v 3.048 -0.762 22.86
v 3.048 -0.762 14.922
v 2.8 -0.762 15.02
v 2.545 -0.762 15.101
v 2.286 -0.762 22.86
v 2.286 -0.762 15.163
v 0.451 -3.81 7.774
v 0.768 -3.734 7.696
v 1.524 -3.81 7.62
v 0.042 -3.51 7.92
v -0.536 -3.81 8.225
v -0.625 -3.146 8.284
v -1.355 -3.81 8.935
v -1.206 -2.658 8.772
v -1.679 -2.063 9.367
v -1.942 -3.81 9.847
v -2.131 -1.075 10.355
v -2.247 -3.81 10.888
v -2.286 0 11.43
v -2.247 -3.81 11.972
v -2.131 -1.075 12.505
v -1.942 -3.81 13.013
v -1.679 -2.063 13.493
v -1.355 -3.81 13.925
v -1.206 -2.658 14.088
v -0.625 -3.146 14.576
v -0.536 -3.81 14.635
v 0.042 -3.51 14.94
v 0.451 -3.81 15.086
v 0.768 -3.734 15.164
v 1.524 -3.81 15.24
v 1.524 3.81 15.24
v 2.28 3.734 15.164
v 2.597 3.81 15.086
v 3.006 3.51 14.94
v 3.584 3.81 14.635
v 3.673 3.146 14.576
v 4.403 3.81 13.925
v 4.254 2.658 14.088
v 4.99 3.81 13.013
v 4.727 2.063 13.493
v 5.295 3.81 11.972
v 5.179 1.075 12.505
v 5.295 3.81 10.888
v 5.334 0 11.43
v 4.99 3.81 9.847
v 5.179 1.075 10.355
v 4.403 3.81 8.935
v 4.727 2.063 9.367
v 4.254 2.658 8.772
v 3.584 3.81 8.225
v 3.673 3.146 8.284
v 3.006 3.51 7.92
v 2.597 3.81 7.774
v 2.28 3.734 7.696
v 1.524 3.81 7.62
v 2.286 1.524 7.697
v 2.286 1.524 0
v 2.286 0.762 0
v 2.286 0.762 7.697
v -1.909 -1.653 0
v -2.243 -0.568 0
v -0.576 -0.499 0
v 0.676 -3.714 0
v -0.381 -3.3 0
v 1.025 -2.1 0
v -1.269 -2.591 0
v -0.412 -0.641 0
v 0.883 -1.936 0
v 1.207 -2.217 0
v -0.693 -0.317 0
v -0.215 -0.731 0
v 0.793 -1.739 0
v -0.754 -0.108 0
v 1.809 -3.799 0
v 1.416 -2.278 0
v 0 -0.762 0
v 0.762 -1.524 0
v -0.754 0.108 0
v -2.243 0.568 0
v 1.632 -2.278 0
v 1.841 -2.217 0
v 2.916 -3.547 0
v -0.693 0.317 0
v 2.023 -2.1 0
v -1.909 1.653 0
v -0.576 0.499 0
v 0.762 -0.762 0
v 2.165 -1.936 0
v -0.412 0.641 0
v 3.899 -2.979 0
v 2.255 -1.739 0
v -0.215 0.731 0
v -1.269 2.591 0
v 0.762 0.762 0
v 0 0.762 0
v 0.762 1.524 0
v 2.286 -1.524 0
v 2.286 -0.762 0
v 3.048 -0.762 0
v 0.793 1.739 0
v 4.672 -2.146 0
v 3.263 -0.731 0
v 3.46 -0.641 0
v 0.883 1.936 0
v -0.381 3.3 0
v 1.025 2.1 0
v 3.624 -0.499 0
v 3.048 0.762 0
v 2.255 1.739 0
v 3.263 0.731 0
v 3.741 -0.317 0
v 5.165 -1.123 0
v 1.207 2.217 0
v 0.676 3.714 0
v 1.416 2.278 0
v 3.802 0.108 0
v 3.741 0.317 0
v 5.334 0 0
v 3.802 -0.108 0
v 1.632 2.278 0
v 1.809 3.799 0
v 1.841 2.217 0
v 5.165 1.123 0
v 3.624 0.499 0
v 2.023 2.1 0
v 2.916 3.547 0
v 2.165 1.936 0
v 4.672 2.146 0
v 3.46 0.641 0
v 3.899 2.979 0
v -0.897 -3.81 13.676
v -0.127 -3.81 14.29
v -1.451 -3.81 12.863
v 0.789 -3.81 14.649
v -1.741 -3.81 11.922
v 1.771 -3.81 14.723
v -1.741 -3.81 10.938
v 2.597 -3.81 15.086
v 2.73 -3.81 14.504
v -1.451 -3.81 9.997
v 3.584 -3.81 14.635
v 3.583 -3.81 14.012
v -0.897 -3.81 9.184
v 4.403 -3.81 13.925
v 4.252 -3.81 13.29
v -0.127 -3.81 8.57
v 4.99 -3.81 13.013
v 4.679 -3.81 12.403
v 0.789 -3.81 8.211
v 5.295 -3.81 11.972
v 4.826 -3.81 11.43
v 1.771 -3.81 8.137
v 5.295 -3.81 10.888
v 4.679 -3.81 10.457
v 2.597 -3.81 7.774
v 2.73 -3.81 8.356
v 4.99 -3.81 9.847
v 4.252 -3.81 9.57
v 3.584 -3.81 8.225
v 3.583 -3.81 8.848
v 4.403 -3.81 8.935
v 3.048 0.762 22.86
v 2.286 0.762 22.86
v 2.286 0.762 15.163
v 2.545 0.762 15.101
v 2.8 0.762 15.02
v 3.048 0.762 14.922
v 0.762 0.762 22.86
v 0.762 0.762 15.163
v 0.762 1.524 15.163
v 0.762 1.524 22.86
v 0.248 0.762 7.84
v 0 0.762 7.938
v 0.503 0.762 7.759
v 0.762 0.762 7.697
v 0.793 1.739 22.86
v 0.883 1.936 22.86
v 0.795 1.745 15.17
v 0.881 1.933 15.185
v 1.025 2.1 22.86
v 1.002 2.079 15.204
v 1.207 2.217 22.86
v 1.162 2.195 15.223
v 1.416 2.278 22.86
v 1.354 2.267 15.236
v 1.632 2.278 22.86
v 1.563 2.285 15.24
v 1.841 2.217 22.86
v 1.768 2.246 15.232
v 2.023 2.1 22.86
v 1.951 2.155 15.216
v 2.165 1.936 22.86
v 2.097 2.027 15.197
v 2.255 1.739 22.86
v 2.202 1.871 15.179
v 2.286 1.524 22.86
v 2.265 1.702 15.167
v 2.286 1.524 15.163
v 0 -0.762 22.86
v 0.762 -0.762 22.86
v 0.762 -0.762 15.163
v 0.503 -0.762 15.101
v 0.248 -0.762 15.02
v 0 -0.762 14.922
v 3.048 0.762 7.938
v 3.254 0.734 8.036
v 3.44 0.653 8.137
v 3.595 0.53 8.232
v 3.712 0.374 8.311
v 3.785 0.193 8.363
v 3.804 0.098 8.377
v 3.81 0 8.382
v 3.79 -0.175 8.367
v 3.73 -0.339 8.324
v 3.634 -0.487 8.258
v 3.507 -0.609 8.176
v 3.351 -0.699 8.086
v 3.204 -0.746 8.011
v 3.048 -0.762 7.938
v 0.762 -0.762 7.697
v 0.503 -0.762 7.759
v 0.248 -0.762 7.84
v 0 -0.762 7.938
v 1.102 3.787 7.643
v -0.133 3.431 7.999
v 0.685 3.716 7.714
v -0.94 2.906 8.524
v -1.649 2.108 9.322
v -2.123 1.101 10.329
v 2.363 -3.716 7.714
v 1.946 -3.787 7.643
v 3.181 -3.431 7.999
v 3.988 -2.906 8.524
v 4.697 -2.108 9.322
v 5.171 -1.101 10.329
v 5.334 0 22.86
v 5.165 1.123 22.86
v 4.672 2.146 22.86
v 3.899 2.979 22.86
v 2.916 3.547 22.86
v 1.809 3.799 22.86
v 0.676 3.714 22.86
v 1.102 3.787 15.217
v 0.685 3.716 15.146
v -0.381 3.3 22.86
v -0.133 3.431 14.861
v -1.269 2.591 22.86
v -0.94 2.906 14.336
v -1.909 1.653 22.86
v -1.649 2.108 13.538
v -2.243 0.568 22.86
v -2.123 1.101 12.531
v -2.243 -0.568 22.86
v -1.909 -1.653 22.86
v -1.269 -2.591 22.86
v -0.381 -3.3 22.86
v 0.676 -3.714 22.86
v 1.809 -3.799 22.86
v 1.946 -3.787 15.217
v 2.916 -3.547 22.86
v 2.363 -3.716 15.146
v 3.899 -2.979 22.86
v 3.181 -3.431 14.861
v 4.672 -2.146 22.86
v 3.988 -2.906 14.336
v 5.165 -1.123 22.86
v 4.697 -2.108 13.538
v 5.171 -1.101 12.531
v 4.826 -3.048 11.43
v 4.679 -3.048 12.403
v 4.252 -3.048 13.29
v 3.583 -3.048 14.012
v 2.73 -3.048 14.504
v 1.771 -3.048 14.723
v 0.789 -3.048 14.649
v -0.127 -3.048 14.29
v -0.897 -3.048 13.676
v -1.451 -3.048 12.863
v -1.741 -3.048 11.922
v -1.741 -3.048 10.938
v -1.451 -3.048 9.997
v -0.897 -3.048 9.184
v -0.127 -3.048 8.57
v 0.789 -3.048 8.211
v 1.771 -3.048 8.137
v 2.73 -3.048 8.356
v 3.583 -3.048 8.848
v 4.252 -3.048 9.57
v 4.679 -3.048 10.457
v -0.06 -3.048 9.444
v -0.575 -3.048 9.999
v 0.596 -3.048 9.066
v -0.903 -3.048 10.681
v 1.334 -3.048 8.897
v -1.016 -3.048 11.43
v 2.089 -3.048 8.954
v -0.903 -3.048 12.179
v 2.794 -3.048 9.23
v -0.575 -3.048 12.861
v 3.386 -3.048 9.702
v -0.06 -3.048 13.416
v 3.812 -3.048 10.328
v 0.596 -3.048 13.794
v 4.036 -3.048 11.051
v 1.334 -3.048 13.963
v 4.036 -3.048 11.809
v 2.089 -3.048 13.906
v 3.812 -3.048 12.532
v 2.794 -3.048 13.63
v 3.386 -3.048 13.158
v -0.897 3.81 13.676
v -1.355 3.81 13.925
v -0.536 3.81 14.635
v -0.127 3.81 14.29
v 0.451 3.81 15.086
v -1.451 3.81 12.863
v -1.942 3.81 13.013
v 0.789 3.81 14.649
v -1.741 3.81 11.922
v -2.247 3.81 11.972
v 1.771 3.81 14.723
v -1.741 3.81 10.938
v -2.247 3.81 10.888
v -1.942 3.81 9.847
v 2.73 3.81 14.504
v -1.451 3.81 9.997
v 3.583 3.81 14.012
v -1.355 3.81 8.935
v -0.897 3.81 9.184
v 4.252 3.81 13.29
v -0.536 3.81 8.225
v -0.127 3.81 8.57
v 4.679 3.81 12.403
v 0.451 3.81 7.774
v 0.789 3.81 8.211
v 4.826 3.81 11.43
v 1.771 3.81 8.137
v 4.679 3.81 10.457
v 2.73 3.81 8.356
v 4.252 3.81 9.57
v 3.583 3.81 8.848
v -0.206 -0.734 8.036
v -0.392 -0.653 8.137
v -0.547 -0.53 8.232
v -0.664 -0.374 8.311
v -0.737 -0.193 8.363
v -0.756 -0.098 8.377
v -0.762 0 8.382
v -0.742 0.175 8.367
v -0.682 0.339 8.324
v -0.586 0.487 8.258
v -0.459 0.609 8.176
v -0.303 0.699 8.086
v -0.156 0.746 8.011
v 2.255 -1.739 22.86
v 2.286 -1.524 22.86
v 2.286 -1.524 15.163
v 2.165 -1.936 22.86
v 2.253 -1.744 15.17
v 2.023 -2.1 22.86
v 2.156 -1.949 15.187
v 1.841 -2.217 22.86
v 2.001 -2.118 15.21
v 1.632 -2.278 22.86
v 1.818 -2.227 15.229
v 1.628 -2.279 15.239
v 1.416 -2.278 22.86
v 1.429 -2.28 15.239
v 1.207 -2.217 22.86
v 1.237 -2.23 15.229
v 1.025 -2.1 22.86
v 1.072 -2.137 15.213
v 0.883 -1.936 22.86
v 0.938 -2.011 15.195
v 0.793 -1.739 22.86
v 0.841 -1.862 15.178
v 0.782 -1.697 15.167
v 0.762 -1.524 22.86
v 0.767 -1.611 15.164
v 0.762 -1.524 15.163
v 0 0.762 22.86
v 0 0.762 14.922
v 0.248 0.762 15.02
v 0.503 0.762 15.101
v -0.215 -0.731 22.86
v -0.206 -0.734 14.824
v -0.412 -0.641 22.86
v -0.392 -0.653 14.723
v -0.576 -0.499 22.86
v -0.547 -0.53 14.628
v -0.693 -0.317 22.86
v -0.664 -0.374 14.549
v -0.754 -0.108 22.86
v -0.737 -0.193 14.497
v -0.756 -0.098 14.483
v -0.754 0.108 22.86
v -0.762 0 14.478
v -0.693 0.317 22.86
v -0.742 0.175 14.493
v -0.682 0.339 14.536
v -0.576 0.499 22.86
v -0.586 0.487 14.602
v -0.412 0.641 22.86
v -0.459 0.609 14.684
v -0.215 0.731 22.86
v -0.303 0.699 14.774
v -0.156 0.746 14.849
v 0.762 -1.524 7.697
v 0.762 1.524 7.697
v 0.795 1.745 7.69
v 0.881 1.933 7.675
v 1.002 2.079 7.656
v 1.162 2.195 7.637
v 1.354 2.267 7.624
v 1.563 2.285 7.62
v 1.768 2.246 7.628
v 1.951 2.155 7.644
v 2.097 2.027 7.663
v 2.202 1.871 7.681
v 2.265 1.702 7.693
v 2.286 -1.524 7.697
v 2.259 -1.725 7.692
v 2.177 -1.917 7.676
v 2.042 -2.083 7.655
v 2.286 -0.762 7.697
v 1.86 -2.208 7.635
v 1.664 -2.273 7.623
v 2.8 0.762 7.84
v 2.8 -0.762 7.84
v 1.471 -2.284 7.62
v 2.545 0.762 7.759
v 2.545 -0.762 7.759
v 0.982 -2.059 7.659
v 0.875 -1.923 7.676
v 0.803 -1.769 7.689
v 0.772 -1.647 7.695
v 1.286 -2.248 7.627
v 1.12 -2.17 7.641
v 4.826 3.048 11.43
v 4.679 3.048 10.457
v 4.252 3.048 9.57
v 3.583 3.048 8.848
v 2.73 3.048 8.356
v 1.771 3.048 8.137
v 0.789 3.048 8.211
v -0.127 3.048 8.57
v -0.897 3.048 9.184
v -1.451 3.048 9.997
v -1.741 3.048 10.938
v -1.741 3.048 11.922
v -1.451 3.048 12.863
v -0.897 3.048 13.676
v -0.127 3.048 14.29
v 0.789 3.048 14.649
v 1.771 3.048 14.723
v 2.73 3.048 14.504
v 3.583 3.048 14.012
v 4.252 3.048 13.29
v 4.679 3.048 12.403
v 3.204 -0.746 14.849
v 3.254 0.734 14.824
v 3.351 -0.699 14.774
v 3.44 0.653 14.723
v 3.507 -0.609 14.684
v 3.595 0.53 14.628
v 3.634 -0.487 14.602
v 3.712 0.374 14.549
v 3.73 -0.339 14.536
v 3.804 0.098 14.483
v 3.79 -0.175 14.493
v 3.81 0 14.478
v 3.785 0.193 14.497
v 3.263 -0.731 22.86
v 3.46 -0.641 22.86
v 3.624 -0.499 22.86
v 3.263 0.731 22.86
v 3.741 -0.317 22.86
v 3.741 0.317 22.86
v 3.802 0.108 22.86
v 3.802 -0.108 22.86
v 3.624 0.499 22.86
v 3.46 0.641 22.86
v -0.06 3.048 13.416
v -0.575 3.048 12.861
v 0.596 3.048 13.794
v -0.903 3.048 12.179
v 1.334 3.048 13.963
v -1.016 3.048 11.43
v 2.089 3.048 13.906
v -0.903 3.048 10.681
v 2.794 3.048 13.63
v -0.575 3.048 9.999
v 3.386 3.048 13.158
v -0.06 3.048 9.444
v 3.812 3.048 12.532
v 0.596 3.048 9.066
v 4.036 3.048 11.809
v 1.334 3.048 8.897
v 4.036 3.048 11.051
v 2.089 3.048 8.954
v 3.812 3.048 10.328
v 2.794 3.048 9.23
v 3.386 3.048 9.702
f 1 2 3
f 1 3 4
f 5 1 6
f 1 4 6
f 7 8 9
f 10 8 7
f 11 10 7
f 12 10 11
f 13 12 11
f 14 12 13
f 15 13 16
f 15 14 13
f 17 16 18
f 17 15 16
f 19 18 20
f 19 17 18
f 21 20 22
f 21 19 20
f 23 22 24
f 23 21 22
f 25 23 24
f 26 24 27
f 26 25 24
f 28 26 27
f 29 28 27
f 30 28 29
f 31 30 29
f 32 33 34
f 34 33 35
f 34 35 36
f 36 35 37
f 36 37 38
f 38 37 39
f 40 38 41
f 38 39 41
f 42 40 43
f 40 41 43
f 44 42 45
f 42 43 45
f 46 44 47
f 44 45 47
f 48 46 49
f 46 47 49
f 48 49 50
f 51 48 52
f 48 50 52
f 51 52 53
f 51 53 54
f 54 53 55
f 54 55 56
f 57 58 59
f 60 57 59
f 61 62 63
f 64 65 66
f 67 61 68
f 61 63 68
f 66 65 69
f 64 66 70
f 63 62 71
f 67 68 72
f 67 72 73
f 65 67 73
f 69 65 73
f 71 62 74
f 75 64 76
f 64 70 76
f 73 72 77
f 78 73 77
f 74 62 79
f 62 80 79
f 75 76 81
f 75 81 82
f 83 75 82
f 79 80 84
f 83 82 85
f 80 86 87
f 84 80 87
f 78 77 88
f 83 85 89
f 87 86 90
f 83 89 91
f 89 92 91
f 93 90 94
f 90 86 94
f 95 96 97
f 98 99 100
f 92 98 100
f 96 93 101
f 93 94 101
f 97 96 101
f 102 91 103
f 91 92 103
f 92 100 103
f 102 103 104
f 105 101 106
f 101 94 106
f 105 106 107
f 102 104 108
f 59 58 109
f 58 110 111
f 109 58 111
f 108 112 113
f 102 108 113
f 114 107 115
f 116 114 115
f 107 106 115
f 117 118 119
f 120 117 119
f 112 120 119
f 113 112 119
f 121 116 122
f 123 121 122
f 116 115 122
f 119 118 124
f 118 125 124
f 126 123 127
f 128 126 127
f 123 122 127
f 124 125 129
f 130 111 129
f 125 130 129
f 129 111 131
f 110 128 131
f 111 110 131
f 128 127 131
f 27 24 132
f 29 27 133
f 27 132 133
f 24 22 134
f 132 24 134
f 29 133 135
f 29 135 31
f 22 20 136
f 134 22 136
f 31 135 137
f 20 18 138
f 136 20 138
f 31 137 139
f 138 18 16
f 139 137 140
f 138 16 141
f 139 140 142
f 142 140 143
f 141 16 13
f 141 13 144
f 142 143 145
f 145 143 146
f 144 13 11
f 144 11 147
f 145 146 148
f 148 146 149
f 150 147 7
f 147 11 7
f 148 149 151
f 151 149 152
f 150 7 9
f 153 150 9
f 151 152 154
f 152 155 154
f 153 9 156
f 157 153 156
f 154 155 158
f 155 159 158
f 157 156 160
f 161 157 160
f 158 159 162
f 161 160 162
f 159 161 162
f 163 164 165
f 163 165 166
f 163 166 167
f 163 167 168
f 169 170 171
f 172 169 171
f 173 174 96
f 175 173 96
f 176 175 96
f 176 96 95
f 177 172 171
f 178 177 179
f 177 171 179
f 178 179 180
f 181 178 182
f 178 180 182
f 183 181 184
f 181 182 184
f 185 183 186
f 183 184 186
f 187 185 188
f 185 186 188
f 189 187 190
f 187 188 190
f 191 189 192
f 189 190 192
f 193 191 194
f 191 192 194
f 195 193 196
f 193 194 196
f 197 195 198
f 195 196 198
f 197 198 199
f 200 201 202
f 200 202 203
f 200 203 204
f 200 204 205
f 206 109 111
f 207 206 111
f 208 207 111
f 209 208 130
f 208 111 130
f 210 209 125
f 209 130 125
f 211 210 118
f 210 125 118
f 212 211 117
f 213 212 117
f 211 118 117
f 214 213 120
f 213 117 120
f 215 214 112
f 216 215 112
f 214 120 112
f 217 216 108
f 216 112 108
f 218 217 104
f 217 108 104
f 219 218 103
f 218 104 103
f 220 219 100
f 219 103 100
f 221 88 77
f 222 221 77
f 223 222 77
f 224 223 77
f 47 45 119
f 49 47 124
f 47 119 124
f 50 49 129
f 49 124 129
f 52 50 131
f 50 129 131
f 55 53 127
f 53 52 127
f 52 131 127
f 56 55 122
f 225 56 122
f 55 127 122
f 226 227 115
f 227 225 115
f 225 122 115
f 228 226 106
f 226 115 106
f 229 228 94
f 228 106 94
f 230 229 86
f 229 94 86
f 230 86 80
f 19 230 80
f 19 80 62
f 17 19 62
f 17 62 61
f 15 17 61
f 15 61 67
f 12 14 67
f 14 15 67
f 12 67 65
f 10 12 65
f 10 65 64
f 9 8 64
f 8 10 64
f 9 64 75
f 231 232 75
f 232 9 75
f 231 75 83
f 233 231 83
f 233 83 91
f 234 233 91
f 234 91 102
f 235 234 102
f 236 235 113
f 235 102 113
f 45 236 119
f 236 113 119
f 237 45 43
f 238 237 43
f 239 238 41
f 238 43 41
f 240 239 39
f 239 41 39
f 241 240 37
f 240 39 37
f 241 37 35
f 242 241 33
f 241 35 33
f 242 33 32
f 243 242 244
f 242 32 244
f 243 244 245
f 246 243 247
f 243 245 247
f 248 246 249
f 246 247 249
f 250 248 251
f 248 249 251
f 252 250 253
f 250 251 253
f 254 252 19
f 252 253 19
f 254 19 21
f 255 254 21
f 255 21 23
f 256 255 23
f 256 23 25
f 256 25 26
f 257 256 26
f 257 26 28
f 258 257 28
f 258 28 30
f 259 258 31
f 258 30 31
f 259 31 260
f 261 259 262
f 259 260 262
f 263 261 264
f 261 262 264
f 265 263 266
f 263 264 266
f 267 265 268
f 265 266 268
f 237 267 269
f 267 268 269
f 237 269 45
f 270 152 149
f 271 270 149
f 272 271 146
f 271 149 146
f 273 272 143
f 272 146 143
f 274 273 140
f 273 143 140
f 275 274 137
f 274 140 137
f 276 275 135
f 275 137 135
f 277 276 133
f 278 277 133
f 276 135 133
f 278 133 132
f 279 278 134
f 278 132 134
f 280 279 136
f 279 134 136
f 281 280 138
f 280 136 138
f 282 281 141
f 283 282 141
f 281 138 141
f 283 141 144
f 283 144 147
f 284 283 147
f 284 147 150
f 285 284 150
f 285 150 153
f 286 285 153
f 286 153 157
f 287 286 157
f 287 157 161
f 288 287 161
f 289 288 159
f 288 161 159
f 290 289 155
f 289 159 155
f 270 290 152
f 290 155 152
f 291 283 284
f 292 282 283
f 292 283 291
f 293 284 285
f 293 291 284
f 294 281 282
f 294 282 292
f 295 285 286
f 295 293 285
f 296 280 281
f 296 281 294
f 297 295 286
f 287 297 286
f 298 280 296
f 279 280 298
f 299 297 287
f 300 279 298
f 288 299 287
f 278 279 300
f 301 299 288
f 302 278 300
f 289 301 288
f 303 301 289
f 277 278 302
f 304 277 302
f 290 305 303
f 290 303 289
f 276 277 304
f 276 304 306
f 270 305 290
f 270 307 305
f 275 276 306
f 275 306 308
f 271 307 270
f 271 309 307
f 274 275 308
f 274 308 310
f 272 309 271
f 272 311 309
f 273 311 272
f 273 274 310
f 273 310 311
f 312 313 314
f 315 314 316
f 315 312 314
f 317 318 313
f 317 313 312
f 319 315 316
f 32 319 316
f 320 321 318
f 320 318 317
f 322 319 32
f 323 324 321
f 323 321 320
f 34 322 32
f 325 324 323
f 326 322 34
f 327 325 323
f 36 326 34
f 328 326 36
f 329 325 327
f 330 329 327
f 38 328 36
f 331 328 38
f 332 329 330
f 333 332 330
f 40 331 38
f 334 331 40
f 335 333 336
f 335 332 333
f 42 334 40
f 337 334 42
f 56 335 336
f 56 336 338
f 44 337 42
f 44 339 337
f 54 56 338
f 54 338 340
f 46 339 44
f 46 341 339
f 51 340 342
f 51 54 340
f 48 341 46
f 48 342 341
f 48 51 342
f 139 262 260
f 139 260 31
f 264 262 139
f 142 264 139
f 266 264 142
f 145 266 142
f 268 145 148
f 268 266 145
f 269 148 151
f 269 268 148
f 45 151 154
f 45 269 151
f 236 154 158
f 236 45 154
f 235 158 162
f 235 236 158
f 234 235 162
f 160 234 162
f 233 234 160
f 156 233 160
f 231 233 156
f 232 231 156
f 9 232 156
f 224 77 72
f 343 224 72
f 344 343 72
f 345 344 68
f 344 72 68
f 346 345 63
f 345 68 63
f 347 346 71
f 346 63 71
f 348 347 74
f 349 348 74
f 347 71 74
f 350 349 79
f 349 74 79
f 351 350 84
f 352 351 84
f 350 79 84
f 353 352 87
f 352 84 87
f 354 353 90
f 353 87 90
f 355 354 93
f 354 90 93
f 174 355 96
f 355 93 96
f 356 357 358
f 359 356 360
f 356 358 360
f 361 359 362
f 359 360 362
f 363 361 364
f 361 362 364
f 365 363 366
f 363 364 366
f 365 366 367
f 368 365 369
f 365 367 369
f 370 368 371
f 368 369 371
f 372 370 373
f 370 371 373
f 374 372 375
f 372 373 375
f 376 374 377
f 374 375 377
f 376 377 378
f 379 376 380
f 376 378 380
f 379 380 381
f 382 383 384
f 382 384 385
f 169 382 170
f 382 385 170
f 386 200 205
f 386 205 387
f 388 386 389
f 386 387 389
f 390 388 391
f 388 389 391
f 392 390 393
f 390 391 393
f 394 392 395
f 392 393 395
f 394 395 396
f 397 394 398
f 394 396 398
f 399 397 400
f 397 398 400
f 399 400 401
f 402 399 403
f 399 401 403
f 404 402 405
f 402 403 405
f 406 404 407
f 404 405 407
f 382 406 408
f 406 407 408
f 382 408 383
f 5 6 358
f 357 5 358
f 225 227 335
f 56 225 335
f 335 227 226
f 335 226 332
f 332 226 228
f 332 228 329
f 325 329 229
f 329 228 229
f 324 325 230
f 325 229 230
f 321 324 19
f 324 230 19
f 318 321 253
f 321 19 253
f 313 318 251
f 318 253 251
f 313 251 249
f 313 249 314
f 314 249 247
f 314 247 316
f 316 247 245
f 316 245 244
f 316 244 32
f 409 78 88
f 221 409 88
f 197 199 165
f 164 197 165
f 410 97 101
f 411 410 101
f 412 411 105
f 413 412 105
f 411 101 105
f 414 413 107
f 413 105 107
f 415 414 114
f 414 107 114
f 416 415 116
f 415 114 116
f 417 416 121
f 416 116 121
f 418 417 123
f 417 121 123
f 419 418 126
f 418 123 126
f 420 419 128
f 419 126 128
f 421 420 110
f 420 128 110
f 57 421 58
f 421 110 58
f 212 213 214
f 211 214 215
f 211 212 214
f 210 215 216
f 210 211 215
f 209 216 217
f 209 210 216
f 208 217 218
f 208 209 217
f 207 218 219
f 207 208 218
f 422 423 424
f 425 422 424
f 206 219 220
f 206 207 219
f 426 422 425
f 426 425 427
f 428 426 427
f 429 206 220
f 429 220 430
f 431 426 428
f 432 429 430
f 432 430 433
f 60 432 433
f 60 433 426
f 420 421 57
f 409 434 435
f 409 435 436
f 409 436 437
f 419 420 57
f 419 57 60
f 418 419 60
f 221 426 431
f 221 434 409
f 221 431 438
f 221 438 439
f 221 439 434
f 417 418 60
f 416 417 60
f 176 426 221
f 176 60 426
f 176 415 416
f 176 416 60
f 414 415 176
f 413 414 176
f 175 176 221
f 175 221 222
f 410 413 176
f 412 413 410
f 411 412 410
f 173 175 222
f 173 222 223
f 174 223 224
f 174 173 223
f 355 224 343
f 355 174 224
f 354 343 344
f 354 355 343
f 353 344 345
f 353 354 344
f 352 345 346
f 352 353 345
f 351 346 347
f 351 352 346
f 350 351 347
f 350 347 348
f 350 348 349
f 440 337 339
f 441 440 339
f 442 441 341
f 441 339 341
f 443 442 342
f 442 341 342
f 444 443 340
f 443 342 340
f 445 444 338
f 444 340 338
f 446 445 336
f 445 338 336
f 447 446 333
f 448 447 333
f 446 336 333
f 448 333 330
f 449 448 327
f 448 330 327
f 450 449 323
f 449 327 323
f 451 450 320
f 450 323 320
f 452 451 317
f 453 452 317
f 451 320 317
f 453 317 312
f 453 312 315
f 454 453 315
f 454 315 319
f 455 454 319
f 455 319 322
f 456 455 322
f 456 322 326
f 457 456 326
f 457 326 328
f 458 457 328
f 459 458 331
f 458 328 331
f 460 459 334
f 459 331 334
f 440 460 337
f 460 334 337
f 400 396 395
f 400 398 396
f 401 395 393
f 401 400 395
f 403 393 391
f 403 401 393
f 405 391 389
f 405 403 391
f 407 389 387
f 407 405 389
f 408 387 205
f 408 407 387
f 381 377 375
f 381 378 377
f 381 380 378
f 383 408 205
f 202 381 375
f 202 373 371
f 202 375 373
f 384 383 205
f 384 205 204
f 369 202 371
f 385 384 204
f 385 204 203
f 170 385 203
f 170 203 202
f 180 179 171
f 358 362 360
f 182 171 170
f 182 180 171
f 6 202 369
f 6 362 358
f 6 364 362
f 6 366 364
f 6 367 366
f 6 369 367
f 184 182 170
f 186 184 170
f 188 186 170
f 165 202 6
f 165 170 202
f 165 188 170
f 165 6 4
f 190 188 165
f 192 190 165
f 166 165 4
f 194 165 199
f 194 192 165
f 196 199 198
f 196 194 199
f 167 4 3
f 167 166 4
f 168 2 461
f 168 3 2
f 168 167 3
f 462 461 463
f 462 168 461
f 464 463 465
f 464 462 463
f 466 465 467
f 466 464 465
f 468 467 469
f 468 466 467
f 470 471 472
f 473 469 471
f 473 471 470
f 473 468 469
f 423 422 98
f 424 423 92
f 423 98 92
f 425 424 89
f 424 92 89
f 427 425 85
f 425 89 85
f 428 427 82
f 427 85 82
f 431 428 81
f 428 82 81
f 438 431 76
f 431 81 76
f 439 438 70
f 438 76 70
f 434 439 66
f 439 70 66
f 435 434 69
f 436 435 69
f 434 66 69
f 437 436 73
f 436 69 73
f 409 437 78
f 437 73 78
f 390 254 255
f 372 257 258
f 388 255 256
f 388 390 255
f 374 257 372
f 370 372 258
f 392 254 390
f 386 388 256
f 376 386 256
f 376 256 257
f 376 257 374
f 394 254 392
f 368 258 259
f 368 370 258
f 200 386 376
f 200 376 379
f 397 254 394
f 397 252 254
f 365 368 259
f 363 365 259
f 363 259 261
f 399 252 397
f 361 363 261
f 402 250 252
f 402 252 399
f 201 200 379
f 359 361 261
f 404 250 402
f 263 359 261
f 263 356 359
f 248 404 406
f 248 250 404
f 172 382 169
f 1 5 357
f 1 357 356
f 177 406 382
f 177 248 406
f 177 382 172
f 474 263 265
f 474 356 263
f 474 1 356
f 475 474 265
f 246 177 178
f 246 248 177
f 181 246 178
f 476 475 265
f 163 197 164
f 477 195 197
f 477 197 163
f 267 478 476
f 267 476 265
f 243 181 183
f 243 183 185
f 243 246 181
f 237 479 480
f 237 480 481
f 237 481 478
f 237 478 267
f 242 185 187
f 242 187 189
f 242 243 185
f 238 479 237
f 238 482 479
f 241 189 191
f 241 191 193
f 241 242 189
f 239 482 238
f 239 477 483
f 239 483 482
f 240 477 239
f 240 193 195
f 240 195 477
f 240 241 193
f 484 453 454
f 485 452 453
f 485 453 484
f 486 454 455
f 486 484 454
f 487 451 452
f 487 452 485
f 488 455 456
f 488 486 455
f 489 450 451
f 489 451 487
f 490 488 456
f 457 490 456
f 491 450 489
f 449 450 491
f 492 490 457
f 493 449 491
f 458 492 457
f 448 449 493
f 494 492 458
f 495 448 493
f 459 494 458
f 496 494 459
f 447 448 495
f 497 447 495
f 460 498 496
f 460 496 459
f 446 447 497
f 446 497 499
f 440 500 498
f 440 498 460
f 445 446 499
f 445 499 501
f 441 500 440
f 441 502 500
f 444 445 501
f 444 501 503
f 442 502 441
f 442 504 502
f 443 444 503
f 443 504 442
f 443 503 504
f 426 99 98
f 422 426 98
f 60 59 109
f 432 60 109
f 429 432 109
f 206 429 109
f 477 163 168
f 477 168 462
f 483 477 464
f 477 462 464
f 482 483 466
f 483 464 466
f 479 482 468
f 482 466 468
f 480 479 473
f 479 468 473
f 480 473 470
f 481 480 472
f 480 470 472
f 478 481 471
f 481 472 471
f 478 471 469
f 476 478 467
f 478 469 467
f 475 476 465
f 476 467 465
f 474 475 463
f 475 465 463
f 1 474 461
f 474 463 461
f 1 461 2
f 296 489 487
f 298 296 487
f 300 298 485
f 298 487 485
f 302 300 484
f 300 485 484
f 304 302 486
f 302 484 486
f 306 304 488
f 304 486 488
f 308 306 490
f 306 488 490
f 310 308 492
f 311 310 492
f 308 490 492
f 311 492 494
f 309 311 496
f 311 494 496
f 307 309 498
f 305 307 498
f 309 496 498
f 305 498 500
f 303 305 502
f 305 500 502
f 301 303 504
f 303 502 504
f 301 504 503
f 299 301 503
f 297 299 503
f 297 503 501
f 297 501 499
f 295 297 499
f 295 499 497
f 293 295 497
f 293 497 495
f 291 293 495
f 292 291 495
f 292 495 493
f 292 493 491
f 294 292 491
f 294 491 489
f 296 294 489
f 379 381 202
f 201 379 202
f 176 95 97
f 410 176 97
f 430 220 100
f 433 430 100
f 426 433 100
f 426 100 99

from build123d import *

# Parameters (mm, degrees)
SKETCH1_R                = 3.81
BOSS_EXTRUDE1_DEPTH      = 22.86
BOSS_EXTRUDE2_DEPTH      = 3.81
BOSS_EXTRUDE2_DEPTH_BACK = 3.81
SKETCH2_R                = 3.81
SKETCH4_R                = 2.54
CUT_EXTRUDE1_DEPTH       = 25.679861437
SKETCH5_R                = 3.302
CUT_EXTRUDE2_DEPTH       = 0.762
CUT_EXTRUDE3_START       = -0.762
SKETCH6_R                = 3.302
CUT_EXTRUDE3_DEPTH       = 0.762


with BuildPart() as part:
    # Sketch1 → Boss-Extrude1 (new body)
    with BuildSketch(Plane.XY):
        with Locations((1.524, 0)):
            Circle(SKETCH1_R)
        with BuildLine():
            ThreePointArc((0, -0.762), (-0.762, 0), (0, 0.762))
            Line((0, 0.762), (0.762, 0.762))
            Line((0.762, 0.762), (0.762, 1.524))
            ThreePointArc((0.762, 1.524), (1.524, 2.286), (2.286, 1.524))
            Line((2.286, 1.524), (2.286, 0.762))
            Line((2.286, 0.762), (3.048, 0.762))
            ThreePointArc((3.048, 0.762), (3.81, 0), (3.048, -0.762))
            Line((3.048, -0.762), (2.286, -0.762))
            Line((2.286, -0.762), (2.286, -1.524))
            ThreePointArc((2.286, -1.524), (1.524, -2.286), (0.762, -1.524))
            Line((0.762, -1.524), (0.762, -0.762))
            Line((0.762, -0.762), (0, -0.762))
        make_face(mode=Mode.SUBTRACT)
    extrude(amount=BOSS_EXTRUDE1_DEPTH)

    # Sketch2 → Boss-Extrude2 (add, two sides: drawn at the far end of the back side and taken through both)
    with BuildSketch(Plane(origin=(0, 0, 0), x_dir=(1, 0, 0), z_dir=(0, 1, 0)).offset(-BOSS_EXTRUDE2_DEPTH_BACK)):
        with Locations((1.524, -11.43)):
            Circle(SKETCH2_R)
    extrude(amount=BOSS_EXTRUDE2_DEPTH + BOSS_EXTRUDE2_DEPTH_BACK)

    # Sketch4 → Cut-Extrude1 (cut, through all)
    with BuildSketch(Plane(origin=(0, 3.81, 0), x_dir=(-1, 0, 0), z_dir=(0, 1, 0))):
        with Locations((-1.524, 11.43)):
            Circle(SKETCH4_R)
    extrude(amount=-CUT_EXTRUDE1_DEPTH, mode=Mode.SUBTRACT)

    # Sketch5 → Cut-Extrude2 (cut)
    with BuildSketch(Plane(origin=(0, 3.81, 0), x_dir=(1, 0, 0), z_dir=(0, 1, 0))):
        with Locations((1.524, -11.43)):
            Circle(SKETCH5_R)
    extrude(amount=-CUT_EXTRUDE2_DEPTH, mode=Mode.SUBTRACT)

    # Sketch6 → Cut-Extrude3 (cut)
    with BuildSketch(Plane.XZ.offset(3.81).offset(CUT_EXTRUDE3_START)):
        with Locations((1.524, 11.43)):
            Circle(SKETCH6_R)
    extrude(amount=CUT_EXTRUDE3_DEPTH, mode=Mode.SUBTRACT)


solid = part.part
